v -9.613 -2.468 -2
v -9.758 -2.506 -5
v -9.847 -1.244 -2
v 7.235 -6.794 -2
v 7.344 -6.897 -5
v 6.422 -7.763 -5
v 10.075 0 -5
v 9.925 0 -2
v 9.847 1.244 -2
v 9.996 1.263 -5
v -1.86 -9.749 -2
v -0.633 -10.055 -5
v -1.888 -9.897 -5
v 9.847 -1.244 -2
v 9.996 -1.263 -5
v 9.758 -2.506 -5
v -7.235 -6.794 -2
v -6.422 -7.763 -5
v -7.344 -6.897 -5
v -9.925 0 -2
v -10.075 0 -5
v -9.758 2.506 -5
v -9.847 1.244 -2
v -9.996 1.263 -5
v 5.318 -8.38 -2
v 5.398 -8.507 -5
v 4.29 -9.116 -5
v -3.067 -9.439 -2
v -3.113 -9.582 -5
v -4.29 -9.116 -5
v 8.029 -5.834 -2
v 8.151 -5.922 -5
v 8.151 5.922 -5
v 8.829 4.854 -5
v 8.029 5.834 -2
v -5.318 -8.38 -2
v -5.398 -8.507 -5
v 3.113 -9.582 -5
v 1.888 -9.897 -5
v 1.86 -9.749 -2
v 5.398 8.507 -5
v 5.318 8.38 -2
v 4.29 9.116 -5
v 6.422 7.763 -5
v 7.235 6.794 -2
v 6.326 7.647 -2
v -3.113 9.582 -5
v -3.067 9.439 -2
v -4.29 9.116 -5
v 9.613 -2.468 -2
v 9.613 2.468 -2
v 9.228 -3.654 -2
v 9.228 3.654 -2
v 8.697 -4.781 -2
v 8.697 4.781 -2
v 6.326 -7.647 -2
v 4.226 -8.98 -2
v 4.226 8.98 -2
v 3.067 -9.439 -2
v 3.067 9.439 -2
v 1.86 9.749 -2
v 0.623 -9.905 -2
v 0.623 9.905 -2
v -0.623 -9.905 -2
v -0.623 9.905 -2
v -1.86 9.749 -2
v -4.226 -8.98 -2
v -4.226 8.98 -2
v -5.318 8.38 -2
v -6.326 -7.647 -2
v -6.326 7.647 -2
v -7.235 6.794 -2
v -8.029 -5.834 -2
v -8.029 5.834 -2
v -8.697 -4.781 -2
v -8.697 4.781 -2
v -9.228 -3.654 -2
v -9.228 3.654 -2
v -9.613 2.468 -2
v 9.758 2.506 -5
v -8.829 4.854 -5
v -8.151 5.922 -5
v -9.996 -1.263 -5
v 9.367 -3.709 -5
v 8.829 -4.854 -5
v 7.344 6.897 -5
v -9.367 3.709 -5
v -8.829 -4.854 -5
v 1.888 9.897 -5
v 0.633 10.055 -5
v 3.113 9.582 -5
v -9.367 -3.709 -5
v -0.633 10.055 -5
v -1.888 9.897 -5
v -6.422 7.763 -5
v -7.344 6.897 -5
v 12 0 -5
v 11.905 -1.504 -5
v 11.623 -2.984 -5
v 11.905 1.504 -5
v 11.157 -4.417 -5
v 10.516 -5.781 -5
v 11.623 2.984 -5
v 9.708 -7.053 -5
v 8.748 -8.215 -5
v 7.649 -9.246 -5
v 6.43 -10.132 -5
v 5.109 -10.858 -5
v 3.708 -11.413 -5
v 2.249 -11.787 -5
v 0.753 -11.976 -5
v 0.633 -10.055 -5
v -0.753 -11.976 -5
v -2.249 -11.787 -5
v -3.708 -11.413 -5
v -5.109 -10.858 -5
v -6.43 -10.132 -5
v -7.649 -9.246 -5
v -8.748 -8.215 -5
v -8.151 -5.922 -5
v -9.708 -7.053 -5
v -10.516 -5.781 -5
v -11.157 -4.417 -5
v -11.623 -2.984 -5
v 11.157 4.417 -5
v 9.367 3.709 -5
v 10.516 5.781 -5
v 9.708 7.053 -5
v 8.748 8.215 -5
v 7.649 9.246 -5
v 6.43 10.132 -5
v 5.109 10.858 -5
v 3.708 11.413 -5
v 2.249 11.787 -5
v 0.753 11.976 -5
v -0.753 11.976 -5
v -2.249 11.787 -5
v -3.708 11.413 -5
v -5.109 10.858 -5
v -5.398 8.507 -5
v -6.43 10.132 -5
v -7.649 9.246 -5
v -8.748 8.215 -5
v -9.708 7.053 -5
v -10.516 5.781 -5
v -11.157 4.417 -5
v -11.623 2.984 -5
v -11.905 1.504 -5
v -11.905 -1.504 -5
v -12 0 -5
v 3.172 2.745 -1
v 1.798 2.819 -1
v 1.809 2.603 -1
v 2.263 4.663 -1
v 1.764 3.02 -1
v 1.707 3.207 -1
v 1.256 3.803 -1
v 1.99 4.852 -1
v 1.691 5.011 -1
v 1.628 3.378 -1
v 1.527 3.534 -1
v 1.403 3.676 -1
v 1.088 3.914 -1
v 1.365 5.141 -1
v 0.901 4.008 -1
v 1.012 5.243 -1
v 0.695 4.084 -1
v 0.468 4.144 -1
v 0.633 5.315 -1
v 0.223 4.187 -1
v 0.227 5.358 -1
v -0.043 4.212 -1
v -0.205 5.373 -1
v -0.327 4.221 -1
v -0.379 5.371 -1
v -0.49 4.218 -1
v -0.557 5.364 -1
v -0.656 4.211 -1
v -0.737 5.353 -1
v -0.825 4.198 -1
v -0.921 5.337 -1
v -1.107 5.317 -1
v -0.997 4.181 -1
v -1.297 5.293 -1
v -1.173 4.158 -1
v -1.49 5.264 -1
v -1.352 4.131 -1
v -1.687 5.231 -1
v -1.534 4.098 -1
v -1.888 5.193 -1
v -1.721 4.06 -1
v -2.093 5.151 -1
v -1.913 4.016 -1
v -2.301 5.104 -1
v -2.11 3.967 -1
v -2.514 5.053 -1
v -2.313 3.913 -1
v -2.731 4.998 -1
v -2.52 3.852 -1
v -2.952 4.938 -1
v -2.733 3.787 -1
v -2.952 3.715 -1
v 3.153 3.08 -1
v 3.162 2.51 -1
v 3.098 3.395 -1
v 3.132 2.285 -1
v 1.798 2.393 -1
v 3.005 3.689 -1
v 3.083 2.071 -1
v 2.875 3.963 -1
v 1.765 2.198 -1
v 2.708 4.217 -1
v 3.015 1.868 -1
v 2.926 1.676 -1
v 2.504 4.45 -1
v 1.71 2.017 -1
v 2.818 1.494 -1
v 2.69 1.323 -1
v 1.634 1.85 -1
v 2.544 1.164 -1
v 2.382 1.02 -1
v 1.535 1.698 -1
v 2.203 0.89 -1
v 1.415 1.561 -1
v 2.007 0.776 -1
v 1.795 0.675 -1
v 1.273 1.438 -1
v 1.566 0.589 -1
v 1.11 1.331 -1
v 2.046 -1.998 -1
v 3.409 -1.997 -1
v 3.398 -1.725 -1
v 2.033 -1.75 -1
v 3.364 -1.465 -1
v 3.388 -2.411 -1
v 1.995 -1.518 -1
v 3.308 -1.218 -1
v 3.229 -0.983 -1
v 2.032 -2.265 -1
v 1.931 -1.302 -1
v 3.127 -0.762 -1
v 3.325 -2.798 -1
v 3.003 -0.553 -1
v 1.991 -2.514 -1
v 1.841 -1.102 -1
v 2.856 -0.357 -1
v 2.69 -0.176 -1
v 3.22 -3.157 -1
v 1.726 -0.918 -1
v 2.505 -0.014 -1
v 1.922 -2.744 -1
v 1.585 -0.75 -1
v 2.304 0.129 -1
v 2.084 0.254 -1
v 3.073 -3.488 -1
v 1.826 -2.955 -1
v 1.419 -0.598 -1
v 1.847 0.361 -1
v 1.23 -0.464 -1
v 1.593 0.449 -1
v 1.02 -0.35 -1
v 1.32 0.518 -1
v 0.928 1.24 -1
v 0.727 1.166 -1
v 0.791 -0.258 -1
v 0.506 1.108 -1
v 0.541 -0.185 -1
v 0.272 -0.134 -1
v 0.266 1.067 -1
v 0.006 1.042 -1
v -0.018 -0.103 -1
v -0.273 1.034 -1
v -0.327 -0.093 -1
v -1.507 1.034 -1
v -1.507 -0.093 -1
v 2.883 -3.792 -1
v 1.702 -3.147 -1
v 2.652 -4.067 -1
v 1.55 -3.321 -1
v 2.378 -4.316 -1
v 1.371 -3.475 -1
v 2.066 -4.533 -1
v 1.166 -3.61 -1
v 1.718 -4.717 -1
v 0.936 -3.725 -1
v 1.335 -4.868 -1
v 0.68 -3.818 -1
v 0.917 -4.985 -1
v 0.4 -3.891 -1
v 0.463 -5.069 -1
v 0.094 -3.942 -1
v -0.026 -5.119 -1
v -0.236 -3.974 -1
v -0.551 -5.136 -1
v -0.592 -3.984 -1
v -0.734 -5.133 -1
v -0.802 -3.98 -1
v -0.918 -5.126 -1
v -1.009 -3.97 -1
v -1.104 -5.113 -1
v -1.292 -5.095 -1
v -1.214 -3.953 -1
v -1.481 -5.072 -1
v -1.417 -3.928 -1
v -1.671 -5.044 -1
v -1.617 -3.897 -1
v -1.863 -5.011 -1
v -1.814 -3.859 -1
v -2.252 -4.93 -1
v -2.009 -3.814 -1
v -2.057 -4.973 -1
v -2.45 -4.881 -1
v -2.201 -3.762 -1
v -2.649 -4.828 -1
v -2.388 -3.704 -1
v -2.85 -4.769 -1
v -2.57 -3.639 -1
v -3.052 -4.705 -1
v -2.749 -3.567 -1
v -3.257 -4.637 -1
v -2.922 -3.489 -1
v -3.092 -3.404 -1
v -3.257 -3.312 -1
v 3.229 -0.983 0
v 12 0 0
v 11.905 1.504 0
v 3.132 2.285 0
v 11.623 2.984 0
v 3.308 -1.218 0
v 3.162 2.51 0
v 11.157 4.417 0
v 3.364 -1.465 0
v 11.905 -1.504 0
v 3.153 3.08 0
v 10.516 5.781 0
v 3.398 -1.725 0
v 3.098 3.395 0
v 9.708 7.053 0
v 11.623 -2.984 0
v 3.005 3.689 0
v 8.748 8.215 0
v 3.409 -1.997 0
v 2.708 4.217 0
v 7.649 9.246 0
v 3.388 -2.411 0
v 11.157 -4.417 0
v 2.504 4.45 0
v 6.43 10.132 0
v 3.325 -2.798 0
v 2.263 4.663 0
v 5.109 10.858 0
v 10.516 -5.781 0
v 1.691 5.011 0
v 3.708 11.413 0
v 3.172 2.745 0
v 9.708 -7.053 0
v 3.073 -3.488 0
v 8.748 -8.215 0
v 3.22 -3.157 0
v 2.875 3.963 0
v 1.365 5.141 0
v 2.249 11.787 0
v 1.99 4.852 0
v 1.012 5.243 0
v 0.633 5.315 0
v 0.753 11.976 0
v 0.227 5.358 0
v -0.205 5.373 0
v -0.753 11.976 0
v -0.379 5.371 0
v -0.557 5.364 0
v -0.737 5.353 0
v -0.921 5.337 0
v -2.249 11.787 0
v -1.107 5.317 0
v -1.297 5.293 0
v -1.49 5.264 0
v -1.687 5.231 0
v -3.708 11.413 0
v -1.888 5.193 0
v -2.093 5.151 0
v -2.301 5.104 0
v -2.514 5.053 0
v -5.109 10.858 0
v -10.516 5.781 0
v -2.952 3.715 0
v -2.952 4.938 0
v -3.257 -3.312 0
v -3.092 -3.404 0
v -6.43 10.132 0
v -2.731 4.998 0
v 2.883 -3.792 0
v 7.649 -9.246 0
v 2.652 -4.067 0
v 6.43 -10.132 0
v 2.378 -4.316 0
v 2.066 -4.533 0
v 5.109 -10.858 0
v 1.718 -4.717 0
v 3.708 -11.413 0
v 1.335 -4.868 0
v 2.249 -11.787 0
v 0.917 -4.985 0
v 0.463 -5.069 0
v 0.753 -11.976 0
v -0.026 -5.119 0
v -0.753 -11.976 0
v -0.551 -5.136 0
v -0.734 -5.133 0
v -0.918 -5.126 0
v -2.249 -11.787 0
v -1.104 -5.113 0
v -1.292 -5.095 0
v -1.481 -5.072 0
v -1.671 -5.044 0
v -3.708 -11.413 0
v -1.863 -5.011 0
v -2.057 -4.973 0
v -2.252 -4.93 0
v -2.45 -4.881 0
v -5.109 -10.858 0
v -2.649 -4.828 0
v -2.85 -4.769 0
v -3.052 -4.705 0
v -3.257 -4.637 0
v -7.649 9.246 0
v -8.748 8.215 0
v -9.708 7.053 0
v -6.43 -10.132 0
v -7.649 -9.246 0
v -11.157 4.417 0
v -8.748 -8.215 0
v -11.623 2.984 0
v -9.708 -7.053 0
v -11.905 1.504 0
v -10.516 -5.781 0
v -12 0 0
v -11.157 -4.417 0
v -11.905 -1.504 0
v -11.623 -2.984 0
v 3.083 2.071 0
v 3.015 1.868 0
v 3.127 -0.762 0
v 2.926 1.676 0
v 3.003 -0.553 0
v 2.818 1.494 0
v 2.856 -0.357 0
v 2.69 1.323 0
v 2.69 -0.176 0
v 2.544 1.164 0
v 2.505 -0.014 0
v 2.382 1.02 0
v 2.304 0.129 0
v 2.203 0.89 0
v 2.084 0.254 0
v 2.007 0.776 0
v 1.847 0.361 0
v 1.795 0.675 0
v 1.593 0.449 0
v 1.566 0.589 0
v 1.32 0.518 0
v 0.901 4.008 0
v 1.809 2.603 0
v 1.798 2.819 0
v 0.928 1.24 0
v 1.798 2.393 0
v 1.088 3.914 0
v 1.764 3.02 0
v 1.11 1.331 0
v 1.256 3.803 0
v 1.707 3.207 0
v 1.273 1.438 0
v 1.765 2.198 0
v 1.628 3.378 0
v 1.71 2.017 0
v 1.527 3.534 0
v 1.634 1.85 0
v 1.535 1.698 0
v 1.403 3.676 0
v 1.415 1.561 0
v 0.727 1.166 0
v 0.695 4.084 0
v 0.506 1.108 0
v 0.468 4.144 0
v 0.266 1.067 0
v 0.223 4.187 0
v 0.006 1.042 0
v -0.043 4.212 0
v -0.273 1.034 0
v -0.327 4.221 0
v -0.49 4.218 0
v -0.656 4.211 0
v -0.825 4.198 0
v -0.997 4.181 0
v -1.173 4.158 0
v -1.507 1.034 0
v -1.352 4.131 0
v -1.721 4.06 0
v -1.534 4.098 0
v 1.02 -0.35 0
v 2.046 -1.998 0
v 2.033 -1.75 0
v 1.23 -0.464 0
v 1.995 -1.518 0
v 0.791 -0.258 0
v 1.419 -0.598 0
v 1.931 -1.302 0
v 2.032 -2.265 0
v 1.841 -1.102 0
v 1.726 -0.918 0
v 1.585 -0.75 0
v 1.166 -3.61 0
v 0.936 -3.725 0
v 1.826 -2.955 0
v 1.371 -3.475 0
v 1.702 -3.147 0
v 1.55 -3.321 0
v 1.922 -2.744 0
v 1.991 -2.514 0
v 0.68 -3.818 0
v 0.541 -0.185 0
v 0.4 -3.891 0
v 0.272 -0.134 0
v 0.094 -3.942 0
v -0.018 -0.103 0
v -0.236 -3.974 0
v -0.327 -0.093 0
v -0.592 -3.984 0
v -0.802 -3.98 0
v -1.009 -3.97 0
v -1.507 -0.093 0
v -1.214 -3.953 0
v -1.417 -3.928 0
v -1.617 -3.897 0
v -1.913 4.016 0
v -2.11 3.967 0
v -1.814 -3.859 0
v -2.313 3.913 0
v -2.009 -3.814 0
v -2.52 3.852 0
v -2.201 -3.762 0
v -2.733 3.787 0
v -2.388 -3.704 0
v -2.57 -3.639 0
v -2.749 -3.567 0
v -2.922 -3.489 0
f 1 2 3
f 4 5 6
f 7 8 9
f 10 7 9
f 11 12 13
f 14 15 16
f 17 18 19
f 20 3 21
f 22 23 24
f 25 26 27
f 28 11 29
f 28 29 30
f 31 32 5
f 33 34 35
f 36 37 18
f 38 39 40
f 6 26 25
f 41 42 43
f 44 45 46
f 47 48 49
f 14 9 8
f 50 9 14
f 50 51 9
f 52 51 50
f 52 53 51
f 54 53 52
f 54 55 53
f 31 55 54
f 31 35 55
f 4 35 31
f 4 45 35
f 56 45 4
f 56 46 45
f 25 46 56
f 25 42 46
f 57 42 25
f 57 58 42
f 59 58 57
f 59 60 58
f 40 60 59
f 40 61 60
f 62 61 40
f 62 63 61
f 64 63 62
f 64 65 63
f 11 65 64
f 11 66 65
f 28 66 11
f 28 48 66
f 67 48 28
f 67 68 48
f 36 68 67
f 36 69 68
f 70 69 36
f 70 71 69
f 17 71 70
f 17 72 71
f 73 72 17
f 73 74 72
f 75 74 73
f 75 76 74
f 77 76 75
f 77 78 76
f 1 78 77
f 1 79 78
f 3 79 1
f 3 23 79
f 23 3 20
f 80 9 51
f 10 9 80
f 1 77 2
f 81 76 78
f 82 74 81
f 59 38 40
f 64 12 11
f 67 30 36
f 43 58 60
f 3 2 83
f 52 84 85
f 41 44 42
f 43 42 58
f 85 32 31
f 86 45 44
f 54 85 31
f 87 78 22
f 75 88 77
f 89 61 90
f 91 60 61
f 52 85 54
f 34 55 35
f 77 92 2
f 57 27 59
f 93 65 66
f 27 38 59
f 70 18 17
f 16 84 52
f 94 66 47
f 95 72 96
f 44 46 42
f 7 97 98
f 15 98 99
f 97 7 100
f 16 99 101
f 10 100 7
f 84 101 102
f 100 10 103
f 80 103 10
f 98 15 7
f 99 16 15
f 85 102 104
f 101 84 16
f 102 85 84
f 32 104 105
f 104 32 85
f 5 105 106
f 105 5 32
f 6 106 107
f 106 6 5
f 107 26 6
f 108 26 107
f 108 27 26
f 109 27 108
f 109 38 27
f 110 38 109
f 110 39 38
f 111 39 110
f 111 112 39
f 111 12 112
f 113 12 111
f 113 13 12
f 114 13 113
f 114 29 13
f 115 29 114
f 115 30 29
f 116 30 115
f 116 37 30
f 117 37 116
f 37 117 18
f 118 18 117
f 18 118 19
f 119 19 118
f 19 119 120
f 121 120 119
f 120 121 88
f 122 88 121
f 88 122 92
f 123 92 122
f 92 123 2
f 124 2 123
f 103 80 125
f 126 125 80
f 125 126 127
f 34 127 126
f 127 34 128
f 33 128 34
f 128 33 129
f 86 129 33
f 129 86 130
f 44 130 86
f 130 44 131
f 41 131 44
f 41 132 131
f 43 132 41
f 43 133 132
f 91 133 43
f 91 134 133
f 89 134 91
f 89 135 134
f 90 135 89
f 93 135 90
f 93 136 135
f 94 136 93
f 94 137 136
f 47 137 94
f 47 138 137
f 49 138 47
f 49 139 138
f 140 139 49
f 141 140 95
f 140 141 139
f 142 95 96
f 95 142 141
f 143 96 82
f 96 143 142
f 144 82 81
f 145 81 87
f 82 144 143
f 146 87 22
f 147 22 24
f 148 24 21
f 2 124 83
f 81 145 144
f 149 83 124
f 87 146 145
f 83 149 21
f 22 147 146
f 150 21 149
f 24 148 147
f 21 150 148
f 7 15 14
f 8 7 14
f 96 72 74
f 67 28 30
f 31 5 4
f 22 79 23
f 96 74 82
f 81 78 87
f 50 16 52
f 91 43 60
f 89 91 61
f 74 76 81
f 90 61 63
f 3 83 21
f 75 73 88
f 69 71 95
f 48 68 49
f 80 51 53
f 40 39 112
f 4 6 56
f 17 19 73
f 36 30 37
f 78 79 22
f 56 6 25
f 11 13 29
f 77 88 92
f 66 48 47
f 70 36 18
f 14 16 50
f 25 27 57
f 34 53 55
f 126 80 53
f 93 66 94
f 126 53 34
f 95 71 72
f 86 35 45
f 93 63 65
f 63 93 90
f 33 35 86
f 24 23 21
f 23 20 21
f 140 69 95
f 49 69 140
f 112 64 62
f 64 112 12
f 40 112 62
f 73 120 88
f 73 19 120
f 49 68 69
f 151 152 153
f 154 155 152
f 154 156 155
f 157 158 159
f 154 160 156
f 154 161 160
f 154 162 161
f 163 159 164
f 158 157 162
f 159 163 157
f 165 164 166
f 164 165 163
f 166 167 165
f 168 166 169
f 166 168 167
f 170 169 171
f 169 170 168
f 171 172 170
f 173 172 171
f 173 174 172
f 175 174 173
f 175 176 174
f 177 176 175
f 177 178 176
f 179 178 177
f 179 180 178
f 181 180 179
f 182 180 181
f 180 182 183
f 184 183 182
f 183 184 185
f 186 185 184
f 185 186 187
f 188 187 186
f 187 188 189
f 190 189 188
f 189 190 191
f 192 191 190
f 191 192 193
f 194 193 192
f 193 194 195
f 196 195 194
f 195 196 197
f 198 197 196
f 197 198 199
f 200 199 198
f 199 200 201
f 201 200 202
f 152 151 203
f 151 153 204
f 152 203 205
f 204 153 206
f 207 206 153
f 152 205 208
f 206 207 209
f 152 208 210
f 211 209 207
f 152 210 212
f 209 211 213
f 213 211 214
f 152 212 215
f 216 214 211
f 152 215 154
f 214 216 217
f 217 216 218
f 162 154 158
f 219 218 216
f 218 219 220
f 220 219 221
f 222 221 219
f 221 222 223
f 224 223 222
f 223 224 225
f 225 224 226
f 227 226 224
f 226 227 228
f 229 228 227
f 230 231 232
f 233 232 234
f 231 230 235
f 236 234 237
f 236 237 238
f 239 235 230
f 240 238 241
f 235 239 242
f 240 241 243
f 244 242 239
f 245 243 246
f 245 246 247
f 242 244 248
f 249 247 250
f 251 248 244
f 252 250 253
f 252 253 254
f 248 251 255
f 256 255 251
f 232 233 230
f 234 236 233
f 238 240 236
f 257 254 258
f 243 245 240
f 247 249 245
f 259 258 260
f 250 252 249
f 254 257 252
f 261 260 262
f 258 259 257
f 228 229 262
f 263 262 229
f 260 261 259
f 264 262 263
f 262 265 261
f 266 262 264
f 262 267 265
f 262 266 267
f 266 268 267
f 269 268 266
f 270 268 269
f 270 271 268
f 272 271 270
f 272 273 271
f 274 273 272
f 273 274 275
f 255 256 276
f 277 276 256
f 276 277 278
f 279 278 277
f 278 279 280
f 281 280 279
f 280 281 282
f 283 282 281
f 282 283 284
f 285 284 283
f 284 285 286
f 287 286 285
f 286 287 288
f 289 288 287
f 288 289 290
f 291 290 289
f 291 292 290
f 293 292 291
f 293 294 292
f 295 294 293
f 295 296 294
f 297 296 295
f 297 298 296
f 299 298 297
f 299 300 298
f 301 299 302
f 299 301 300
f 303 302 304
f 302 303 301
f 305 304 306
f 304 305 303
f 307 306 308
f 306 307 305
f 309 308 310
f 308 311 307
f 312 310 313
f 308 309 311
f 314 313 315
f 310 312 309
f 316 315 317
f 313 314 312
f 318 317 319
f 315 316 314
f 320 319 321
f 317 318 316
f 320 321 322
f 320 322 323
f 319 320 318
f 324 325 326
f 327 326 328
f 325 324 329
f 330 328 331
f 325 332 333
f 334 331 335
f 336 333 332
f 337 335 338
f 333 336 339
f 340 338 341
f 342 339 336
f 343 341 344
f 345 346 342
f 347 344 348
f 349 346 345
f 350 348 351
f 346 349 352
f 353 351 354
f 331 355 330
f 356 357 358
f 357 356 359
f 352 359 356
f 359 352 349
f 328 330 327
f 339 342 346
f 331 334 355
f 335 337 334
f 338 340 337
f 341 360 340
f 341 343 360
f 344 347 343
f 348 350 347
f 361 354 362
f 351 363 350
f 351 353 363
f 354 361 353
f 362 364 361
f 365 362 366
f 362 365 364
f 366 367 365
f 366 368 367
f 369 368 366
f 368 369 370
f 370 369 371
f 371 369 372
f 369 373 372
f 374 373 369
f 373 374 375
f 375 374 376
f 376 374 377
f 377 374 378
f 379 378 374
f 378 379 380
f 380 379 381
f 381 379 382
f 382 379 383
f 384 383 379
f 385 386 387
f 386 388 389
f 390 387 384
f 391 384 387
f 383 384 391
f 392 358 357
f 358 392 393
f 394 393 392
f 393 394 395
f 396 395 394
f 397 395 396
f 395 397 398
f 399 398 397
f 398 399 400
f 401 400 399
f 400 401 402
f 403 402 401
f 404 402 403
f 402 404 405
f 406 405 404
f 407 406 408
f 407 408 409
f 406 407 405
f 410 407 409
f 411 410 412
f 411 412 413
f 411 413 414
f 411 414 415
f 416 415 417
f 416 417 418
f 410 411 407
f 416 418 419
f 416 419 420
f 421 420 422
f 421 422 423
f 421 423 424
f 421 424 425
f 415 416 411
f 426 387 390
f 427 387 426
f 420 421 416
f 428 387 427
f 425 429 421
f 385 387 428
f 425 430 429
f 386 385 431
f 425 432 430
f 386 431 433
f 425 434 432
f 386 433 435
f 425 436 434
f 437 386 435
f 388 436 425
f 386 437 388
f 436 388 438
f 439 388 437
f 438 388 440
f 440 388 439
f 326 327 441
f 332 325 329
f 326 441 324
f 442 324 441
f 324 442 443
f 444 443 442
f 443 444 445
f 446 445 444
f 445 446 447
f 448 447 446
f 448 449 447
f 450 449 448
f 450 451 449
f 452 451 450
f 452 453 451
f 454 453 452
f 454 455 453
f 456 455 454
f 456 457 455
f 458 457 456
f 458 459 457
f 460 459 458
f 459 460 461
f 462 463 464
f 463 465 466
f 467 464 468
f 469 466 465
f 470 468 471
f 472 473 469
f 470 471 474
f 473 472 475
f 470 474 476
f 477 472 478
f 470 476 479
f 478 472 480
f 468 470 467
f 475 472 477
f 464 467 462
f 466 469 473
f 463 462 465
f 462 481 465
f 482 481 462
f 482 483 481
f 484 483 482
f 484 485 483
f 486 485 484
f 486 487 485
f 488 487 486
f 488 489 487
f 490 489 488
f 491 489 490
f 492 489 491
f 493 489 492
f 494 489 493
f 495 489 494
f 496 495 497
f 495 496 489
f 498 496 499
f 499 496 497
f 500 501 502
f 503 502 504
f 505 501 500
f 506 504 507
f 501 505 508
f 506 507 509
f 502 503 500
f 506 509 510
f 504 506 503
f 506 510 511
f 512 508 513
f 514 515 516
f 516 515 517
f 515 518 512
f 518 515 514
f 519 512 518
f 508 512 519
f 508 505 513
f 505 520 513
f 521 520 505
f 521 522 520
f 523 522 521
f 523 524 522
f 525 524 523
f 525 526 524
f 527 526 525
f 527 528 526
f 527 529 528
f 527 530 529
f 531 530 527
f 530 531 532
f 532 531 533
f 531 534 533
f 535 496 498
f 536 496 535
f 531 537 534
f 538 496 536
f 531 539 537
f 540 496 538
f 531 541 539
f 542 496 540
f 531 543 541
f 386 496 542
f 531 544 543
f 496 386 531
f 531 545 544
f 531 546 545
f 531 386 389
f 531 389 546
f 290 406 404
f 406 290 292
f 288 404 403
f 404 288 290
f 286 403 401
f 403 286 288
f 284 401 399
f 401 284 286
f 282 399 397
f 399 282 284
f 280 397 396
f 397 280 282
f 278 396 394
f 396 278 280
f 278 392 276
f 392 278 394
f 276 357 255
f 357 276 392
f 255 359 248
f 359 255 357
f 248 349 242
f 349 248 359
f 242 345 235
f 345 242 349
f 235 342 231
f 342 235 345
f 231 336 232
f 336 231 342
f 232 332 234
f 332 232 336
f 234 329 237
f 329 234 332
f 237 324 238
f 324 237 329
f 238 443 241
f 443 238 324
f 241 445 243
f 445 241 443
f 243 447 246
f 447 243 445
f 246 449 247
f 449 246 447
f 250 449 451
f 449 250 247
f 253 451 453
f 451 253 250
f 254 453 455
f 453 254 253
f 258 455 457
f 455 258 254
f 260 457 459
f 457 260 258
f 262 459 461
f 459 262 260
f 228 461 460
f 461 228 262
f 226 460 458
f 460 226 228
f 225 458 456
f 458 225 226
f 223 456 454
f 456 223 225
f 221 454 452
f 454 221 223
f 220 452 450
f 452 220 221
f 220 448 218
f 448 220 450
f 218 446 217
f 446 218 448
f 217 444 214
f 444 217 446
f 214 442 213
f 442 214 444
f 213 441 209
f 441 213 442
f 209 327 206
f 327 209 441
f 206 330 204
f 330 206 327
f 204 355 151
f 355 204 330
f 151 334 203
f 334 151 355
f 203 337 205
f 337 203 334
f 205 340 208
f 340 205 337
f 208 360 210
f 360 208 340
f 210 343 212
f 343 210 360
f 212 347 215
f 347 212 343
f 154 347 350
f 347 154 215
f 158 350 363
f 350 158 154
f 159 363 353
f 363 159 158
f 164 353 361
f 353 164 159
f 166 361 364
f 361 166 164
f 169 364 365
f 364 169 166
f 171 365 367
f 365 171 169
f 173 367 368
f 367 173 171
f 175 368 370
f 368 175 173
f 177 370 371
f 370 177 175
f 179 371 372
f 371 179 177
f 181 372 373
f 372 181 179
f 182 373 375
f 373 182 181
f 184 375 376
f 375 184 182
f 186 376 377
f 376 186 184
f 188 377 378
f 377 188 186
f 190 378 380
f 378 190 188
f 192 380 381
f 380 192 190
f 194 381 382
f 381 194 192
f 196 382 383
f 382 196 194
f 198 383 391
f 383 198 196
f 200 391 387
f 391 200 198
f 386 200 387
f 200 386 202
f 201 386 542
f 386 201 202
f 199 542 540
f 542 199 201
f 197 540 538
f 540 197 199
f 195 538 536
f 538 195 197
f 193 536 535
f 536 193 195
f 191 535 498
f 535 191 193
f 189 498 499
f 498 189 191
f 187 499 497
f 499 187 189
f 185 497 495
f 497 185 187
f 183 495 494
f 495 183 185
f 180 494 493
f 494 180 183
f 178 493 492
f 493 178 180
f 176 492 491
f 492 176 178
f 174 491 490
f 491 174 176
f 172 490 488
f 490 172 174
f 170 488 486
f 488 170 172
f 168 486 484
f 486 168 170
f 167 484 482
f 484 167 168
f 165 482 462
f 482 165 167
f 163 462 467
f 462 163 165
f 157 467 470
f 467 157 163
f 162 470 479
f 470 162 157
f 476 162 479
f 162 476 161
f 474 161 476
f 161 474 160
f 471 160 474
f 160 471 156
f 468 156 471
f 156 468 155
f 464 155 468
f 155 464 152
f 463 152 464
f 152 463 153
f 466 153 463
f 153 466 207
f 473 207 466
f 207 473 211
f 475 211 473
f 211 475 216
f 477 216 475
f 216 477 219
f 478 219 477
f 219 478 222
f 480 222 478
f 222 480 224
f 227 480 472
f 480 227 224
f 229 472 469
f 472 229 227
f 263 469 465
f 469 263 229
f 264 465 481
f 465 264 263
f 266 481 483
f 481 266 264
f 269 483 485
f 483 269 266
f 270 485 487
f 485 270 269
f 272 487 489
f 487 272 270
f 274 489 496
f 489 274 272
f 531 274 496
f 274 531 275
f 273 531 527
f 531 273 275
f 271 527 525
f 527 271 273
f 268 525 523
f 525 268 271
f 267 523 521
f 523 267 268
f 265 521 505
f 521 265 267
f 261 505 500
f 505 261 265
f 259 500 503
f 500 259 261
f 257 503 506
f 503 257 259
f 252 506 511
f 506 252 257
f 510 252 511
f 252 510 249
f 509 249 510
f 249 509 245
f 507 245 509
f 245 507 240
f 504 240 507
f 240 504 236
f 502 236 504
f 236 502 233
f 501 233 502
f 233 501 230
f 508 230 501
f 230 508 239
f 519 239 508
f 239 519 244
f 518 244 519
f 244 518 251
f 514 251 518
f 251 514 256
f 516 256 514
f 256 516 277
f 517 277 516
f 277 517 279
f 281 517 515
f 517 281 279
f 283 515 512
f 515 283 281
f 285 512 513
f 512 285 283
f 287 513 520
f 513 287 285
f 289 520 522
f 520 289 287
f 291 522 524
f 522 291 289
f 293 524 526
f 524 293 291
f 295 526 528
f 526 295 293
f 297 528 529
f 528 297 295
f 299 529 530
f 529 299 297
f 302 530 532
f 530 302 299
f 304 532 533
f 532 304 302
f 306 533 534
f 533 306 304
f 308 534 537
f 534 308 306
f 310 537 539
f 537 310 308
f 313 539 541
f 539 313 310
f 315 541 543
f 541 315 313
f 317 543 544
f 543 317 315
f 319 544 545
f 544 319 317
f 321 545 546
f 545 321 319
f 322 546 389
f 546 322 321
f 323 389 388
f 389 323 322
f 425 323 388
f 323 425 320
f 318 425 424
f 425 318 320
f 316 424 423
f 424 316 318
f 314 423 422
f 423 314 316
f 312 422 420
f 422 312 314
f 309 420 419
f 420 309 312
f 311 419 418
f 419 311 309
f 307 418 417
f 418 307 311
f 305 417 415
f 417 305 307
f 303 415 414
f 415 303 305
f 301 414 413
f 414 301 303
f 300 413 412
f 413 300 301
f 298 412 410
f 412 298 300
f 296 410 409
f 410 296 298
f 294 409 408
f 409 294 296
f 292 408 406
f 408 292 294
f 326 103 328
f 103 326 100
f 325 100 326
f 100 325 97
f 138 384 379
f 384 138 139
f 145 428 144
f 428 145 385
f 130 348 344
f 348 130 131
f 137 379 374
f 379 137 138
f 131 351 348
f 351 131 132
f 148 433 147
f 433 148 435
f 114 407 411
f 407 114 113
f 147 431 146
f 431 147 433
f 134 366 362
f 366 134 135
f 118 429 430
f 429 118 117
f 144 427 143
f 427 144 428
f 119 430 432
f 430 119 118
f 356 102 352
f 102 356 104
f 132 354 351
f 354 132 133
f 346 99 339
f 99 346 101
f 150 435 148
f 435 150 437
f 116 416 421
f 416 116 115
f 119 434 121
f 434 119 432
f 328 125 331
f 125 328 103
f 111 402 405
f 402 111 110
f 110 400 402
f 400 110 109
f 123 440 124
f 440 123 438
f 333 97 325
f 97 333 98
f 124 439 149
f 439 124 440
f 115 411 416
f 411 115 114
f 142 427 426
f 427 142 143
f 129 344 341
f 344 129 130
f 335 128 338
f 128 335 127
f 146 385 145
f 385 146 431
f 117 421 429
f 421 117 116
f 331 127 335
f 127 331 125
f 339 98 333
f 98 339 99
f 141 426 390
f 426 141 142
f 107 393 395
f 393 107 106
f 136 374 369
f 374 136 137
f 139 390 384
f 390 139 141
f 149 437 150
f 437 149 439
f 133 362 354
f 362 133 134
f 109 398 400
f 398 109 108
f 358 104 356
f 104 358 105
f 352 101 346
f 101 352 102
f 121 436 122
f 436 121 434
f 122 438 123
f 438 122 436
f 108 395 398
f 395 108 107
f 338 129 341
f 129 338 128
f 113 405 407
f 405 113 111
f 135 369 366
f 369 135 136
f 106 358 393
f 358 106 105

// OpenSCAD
$fn = 50;

difference() {
	union() {
		translate(v = [0, 0, -5.0]) {
			cylinder(h = 5, r = 12.0);
		}
	}
	union() {
		#translate(v = [0, 0, -5.0]) {
			cylinder(h = 3, r1 = 10.075, r2 = 9.925);
		}
		translate(v = [0, 0, -1]) {
			linear_extrude(height = 1) {
				text(font = "Impact", halign = "center", size = 10, text = "3", valign = "center");
			}
		}
	}
}
